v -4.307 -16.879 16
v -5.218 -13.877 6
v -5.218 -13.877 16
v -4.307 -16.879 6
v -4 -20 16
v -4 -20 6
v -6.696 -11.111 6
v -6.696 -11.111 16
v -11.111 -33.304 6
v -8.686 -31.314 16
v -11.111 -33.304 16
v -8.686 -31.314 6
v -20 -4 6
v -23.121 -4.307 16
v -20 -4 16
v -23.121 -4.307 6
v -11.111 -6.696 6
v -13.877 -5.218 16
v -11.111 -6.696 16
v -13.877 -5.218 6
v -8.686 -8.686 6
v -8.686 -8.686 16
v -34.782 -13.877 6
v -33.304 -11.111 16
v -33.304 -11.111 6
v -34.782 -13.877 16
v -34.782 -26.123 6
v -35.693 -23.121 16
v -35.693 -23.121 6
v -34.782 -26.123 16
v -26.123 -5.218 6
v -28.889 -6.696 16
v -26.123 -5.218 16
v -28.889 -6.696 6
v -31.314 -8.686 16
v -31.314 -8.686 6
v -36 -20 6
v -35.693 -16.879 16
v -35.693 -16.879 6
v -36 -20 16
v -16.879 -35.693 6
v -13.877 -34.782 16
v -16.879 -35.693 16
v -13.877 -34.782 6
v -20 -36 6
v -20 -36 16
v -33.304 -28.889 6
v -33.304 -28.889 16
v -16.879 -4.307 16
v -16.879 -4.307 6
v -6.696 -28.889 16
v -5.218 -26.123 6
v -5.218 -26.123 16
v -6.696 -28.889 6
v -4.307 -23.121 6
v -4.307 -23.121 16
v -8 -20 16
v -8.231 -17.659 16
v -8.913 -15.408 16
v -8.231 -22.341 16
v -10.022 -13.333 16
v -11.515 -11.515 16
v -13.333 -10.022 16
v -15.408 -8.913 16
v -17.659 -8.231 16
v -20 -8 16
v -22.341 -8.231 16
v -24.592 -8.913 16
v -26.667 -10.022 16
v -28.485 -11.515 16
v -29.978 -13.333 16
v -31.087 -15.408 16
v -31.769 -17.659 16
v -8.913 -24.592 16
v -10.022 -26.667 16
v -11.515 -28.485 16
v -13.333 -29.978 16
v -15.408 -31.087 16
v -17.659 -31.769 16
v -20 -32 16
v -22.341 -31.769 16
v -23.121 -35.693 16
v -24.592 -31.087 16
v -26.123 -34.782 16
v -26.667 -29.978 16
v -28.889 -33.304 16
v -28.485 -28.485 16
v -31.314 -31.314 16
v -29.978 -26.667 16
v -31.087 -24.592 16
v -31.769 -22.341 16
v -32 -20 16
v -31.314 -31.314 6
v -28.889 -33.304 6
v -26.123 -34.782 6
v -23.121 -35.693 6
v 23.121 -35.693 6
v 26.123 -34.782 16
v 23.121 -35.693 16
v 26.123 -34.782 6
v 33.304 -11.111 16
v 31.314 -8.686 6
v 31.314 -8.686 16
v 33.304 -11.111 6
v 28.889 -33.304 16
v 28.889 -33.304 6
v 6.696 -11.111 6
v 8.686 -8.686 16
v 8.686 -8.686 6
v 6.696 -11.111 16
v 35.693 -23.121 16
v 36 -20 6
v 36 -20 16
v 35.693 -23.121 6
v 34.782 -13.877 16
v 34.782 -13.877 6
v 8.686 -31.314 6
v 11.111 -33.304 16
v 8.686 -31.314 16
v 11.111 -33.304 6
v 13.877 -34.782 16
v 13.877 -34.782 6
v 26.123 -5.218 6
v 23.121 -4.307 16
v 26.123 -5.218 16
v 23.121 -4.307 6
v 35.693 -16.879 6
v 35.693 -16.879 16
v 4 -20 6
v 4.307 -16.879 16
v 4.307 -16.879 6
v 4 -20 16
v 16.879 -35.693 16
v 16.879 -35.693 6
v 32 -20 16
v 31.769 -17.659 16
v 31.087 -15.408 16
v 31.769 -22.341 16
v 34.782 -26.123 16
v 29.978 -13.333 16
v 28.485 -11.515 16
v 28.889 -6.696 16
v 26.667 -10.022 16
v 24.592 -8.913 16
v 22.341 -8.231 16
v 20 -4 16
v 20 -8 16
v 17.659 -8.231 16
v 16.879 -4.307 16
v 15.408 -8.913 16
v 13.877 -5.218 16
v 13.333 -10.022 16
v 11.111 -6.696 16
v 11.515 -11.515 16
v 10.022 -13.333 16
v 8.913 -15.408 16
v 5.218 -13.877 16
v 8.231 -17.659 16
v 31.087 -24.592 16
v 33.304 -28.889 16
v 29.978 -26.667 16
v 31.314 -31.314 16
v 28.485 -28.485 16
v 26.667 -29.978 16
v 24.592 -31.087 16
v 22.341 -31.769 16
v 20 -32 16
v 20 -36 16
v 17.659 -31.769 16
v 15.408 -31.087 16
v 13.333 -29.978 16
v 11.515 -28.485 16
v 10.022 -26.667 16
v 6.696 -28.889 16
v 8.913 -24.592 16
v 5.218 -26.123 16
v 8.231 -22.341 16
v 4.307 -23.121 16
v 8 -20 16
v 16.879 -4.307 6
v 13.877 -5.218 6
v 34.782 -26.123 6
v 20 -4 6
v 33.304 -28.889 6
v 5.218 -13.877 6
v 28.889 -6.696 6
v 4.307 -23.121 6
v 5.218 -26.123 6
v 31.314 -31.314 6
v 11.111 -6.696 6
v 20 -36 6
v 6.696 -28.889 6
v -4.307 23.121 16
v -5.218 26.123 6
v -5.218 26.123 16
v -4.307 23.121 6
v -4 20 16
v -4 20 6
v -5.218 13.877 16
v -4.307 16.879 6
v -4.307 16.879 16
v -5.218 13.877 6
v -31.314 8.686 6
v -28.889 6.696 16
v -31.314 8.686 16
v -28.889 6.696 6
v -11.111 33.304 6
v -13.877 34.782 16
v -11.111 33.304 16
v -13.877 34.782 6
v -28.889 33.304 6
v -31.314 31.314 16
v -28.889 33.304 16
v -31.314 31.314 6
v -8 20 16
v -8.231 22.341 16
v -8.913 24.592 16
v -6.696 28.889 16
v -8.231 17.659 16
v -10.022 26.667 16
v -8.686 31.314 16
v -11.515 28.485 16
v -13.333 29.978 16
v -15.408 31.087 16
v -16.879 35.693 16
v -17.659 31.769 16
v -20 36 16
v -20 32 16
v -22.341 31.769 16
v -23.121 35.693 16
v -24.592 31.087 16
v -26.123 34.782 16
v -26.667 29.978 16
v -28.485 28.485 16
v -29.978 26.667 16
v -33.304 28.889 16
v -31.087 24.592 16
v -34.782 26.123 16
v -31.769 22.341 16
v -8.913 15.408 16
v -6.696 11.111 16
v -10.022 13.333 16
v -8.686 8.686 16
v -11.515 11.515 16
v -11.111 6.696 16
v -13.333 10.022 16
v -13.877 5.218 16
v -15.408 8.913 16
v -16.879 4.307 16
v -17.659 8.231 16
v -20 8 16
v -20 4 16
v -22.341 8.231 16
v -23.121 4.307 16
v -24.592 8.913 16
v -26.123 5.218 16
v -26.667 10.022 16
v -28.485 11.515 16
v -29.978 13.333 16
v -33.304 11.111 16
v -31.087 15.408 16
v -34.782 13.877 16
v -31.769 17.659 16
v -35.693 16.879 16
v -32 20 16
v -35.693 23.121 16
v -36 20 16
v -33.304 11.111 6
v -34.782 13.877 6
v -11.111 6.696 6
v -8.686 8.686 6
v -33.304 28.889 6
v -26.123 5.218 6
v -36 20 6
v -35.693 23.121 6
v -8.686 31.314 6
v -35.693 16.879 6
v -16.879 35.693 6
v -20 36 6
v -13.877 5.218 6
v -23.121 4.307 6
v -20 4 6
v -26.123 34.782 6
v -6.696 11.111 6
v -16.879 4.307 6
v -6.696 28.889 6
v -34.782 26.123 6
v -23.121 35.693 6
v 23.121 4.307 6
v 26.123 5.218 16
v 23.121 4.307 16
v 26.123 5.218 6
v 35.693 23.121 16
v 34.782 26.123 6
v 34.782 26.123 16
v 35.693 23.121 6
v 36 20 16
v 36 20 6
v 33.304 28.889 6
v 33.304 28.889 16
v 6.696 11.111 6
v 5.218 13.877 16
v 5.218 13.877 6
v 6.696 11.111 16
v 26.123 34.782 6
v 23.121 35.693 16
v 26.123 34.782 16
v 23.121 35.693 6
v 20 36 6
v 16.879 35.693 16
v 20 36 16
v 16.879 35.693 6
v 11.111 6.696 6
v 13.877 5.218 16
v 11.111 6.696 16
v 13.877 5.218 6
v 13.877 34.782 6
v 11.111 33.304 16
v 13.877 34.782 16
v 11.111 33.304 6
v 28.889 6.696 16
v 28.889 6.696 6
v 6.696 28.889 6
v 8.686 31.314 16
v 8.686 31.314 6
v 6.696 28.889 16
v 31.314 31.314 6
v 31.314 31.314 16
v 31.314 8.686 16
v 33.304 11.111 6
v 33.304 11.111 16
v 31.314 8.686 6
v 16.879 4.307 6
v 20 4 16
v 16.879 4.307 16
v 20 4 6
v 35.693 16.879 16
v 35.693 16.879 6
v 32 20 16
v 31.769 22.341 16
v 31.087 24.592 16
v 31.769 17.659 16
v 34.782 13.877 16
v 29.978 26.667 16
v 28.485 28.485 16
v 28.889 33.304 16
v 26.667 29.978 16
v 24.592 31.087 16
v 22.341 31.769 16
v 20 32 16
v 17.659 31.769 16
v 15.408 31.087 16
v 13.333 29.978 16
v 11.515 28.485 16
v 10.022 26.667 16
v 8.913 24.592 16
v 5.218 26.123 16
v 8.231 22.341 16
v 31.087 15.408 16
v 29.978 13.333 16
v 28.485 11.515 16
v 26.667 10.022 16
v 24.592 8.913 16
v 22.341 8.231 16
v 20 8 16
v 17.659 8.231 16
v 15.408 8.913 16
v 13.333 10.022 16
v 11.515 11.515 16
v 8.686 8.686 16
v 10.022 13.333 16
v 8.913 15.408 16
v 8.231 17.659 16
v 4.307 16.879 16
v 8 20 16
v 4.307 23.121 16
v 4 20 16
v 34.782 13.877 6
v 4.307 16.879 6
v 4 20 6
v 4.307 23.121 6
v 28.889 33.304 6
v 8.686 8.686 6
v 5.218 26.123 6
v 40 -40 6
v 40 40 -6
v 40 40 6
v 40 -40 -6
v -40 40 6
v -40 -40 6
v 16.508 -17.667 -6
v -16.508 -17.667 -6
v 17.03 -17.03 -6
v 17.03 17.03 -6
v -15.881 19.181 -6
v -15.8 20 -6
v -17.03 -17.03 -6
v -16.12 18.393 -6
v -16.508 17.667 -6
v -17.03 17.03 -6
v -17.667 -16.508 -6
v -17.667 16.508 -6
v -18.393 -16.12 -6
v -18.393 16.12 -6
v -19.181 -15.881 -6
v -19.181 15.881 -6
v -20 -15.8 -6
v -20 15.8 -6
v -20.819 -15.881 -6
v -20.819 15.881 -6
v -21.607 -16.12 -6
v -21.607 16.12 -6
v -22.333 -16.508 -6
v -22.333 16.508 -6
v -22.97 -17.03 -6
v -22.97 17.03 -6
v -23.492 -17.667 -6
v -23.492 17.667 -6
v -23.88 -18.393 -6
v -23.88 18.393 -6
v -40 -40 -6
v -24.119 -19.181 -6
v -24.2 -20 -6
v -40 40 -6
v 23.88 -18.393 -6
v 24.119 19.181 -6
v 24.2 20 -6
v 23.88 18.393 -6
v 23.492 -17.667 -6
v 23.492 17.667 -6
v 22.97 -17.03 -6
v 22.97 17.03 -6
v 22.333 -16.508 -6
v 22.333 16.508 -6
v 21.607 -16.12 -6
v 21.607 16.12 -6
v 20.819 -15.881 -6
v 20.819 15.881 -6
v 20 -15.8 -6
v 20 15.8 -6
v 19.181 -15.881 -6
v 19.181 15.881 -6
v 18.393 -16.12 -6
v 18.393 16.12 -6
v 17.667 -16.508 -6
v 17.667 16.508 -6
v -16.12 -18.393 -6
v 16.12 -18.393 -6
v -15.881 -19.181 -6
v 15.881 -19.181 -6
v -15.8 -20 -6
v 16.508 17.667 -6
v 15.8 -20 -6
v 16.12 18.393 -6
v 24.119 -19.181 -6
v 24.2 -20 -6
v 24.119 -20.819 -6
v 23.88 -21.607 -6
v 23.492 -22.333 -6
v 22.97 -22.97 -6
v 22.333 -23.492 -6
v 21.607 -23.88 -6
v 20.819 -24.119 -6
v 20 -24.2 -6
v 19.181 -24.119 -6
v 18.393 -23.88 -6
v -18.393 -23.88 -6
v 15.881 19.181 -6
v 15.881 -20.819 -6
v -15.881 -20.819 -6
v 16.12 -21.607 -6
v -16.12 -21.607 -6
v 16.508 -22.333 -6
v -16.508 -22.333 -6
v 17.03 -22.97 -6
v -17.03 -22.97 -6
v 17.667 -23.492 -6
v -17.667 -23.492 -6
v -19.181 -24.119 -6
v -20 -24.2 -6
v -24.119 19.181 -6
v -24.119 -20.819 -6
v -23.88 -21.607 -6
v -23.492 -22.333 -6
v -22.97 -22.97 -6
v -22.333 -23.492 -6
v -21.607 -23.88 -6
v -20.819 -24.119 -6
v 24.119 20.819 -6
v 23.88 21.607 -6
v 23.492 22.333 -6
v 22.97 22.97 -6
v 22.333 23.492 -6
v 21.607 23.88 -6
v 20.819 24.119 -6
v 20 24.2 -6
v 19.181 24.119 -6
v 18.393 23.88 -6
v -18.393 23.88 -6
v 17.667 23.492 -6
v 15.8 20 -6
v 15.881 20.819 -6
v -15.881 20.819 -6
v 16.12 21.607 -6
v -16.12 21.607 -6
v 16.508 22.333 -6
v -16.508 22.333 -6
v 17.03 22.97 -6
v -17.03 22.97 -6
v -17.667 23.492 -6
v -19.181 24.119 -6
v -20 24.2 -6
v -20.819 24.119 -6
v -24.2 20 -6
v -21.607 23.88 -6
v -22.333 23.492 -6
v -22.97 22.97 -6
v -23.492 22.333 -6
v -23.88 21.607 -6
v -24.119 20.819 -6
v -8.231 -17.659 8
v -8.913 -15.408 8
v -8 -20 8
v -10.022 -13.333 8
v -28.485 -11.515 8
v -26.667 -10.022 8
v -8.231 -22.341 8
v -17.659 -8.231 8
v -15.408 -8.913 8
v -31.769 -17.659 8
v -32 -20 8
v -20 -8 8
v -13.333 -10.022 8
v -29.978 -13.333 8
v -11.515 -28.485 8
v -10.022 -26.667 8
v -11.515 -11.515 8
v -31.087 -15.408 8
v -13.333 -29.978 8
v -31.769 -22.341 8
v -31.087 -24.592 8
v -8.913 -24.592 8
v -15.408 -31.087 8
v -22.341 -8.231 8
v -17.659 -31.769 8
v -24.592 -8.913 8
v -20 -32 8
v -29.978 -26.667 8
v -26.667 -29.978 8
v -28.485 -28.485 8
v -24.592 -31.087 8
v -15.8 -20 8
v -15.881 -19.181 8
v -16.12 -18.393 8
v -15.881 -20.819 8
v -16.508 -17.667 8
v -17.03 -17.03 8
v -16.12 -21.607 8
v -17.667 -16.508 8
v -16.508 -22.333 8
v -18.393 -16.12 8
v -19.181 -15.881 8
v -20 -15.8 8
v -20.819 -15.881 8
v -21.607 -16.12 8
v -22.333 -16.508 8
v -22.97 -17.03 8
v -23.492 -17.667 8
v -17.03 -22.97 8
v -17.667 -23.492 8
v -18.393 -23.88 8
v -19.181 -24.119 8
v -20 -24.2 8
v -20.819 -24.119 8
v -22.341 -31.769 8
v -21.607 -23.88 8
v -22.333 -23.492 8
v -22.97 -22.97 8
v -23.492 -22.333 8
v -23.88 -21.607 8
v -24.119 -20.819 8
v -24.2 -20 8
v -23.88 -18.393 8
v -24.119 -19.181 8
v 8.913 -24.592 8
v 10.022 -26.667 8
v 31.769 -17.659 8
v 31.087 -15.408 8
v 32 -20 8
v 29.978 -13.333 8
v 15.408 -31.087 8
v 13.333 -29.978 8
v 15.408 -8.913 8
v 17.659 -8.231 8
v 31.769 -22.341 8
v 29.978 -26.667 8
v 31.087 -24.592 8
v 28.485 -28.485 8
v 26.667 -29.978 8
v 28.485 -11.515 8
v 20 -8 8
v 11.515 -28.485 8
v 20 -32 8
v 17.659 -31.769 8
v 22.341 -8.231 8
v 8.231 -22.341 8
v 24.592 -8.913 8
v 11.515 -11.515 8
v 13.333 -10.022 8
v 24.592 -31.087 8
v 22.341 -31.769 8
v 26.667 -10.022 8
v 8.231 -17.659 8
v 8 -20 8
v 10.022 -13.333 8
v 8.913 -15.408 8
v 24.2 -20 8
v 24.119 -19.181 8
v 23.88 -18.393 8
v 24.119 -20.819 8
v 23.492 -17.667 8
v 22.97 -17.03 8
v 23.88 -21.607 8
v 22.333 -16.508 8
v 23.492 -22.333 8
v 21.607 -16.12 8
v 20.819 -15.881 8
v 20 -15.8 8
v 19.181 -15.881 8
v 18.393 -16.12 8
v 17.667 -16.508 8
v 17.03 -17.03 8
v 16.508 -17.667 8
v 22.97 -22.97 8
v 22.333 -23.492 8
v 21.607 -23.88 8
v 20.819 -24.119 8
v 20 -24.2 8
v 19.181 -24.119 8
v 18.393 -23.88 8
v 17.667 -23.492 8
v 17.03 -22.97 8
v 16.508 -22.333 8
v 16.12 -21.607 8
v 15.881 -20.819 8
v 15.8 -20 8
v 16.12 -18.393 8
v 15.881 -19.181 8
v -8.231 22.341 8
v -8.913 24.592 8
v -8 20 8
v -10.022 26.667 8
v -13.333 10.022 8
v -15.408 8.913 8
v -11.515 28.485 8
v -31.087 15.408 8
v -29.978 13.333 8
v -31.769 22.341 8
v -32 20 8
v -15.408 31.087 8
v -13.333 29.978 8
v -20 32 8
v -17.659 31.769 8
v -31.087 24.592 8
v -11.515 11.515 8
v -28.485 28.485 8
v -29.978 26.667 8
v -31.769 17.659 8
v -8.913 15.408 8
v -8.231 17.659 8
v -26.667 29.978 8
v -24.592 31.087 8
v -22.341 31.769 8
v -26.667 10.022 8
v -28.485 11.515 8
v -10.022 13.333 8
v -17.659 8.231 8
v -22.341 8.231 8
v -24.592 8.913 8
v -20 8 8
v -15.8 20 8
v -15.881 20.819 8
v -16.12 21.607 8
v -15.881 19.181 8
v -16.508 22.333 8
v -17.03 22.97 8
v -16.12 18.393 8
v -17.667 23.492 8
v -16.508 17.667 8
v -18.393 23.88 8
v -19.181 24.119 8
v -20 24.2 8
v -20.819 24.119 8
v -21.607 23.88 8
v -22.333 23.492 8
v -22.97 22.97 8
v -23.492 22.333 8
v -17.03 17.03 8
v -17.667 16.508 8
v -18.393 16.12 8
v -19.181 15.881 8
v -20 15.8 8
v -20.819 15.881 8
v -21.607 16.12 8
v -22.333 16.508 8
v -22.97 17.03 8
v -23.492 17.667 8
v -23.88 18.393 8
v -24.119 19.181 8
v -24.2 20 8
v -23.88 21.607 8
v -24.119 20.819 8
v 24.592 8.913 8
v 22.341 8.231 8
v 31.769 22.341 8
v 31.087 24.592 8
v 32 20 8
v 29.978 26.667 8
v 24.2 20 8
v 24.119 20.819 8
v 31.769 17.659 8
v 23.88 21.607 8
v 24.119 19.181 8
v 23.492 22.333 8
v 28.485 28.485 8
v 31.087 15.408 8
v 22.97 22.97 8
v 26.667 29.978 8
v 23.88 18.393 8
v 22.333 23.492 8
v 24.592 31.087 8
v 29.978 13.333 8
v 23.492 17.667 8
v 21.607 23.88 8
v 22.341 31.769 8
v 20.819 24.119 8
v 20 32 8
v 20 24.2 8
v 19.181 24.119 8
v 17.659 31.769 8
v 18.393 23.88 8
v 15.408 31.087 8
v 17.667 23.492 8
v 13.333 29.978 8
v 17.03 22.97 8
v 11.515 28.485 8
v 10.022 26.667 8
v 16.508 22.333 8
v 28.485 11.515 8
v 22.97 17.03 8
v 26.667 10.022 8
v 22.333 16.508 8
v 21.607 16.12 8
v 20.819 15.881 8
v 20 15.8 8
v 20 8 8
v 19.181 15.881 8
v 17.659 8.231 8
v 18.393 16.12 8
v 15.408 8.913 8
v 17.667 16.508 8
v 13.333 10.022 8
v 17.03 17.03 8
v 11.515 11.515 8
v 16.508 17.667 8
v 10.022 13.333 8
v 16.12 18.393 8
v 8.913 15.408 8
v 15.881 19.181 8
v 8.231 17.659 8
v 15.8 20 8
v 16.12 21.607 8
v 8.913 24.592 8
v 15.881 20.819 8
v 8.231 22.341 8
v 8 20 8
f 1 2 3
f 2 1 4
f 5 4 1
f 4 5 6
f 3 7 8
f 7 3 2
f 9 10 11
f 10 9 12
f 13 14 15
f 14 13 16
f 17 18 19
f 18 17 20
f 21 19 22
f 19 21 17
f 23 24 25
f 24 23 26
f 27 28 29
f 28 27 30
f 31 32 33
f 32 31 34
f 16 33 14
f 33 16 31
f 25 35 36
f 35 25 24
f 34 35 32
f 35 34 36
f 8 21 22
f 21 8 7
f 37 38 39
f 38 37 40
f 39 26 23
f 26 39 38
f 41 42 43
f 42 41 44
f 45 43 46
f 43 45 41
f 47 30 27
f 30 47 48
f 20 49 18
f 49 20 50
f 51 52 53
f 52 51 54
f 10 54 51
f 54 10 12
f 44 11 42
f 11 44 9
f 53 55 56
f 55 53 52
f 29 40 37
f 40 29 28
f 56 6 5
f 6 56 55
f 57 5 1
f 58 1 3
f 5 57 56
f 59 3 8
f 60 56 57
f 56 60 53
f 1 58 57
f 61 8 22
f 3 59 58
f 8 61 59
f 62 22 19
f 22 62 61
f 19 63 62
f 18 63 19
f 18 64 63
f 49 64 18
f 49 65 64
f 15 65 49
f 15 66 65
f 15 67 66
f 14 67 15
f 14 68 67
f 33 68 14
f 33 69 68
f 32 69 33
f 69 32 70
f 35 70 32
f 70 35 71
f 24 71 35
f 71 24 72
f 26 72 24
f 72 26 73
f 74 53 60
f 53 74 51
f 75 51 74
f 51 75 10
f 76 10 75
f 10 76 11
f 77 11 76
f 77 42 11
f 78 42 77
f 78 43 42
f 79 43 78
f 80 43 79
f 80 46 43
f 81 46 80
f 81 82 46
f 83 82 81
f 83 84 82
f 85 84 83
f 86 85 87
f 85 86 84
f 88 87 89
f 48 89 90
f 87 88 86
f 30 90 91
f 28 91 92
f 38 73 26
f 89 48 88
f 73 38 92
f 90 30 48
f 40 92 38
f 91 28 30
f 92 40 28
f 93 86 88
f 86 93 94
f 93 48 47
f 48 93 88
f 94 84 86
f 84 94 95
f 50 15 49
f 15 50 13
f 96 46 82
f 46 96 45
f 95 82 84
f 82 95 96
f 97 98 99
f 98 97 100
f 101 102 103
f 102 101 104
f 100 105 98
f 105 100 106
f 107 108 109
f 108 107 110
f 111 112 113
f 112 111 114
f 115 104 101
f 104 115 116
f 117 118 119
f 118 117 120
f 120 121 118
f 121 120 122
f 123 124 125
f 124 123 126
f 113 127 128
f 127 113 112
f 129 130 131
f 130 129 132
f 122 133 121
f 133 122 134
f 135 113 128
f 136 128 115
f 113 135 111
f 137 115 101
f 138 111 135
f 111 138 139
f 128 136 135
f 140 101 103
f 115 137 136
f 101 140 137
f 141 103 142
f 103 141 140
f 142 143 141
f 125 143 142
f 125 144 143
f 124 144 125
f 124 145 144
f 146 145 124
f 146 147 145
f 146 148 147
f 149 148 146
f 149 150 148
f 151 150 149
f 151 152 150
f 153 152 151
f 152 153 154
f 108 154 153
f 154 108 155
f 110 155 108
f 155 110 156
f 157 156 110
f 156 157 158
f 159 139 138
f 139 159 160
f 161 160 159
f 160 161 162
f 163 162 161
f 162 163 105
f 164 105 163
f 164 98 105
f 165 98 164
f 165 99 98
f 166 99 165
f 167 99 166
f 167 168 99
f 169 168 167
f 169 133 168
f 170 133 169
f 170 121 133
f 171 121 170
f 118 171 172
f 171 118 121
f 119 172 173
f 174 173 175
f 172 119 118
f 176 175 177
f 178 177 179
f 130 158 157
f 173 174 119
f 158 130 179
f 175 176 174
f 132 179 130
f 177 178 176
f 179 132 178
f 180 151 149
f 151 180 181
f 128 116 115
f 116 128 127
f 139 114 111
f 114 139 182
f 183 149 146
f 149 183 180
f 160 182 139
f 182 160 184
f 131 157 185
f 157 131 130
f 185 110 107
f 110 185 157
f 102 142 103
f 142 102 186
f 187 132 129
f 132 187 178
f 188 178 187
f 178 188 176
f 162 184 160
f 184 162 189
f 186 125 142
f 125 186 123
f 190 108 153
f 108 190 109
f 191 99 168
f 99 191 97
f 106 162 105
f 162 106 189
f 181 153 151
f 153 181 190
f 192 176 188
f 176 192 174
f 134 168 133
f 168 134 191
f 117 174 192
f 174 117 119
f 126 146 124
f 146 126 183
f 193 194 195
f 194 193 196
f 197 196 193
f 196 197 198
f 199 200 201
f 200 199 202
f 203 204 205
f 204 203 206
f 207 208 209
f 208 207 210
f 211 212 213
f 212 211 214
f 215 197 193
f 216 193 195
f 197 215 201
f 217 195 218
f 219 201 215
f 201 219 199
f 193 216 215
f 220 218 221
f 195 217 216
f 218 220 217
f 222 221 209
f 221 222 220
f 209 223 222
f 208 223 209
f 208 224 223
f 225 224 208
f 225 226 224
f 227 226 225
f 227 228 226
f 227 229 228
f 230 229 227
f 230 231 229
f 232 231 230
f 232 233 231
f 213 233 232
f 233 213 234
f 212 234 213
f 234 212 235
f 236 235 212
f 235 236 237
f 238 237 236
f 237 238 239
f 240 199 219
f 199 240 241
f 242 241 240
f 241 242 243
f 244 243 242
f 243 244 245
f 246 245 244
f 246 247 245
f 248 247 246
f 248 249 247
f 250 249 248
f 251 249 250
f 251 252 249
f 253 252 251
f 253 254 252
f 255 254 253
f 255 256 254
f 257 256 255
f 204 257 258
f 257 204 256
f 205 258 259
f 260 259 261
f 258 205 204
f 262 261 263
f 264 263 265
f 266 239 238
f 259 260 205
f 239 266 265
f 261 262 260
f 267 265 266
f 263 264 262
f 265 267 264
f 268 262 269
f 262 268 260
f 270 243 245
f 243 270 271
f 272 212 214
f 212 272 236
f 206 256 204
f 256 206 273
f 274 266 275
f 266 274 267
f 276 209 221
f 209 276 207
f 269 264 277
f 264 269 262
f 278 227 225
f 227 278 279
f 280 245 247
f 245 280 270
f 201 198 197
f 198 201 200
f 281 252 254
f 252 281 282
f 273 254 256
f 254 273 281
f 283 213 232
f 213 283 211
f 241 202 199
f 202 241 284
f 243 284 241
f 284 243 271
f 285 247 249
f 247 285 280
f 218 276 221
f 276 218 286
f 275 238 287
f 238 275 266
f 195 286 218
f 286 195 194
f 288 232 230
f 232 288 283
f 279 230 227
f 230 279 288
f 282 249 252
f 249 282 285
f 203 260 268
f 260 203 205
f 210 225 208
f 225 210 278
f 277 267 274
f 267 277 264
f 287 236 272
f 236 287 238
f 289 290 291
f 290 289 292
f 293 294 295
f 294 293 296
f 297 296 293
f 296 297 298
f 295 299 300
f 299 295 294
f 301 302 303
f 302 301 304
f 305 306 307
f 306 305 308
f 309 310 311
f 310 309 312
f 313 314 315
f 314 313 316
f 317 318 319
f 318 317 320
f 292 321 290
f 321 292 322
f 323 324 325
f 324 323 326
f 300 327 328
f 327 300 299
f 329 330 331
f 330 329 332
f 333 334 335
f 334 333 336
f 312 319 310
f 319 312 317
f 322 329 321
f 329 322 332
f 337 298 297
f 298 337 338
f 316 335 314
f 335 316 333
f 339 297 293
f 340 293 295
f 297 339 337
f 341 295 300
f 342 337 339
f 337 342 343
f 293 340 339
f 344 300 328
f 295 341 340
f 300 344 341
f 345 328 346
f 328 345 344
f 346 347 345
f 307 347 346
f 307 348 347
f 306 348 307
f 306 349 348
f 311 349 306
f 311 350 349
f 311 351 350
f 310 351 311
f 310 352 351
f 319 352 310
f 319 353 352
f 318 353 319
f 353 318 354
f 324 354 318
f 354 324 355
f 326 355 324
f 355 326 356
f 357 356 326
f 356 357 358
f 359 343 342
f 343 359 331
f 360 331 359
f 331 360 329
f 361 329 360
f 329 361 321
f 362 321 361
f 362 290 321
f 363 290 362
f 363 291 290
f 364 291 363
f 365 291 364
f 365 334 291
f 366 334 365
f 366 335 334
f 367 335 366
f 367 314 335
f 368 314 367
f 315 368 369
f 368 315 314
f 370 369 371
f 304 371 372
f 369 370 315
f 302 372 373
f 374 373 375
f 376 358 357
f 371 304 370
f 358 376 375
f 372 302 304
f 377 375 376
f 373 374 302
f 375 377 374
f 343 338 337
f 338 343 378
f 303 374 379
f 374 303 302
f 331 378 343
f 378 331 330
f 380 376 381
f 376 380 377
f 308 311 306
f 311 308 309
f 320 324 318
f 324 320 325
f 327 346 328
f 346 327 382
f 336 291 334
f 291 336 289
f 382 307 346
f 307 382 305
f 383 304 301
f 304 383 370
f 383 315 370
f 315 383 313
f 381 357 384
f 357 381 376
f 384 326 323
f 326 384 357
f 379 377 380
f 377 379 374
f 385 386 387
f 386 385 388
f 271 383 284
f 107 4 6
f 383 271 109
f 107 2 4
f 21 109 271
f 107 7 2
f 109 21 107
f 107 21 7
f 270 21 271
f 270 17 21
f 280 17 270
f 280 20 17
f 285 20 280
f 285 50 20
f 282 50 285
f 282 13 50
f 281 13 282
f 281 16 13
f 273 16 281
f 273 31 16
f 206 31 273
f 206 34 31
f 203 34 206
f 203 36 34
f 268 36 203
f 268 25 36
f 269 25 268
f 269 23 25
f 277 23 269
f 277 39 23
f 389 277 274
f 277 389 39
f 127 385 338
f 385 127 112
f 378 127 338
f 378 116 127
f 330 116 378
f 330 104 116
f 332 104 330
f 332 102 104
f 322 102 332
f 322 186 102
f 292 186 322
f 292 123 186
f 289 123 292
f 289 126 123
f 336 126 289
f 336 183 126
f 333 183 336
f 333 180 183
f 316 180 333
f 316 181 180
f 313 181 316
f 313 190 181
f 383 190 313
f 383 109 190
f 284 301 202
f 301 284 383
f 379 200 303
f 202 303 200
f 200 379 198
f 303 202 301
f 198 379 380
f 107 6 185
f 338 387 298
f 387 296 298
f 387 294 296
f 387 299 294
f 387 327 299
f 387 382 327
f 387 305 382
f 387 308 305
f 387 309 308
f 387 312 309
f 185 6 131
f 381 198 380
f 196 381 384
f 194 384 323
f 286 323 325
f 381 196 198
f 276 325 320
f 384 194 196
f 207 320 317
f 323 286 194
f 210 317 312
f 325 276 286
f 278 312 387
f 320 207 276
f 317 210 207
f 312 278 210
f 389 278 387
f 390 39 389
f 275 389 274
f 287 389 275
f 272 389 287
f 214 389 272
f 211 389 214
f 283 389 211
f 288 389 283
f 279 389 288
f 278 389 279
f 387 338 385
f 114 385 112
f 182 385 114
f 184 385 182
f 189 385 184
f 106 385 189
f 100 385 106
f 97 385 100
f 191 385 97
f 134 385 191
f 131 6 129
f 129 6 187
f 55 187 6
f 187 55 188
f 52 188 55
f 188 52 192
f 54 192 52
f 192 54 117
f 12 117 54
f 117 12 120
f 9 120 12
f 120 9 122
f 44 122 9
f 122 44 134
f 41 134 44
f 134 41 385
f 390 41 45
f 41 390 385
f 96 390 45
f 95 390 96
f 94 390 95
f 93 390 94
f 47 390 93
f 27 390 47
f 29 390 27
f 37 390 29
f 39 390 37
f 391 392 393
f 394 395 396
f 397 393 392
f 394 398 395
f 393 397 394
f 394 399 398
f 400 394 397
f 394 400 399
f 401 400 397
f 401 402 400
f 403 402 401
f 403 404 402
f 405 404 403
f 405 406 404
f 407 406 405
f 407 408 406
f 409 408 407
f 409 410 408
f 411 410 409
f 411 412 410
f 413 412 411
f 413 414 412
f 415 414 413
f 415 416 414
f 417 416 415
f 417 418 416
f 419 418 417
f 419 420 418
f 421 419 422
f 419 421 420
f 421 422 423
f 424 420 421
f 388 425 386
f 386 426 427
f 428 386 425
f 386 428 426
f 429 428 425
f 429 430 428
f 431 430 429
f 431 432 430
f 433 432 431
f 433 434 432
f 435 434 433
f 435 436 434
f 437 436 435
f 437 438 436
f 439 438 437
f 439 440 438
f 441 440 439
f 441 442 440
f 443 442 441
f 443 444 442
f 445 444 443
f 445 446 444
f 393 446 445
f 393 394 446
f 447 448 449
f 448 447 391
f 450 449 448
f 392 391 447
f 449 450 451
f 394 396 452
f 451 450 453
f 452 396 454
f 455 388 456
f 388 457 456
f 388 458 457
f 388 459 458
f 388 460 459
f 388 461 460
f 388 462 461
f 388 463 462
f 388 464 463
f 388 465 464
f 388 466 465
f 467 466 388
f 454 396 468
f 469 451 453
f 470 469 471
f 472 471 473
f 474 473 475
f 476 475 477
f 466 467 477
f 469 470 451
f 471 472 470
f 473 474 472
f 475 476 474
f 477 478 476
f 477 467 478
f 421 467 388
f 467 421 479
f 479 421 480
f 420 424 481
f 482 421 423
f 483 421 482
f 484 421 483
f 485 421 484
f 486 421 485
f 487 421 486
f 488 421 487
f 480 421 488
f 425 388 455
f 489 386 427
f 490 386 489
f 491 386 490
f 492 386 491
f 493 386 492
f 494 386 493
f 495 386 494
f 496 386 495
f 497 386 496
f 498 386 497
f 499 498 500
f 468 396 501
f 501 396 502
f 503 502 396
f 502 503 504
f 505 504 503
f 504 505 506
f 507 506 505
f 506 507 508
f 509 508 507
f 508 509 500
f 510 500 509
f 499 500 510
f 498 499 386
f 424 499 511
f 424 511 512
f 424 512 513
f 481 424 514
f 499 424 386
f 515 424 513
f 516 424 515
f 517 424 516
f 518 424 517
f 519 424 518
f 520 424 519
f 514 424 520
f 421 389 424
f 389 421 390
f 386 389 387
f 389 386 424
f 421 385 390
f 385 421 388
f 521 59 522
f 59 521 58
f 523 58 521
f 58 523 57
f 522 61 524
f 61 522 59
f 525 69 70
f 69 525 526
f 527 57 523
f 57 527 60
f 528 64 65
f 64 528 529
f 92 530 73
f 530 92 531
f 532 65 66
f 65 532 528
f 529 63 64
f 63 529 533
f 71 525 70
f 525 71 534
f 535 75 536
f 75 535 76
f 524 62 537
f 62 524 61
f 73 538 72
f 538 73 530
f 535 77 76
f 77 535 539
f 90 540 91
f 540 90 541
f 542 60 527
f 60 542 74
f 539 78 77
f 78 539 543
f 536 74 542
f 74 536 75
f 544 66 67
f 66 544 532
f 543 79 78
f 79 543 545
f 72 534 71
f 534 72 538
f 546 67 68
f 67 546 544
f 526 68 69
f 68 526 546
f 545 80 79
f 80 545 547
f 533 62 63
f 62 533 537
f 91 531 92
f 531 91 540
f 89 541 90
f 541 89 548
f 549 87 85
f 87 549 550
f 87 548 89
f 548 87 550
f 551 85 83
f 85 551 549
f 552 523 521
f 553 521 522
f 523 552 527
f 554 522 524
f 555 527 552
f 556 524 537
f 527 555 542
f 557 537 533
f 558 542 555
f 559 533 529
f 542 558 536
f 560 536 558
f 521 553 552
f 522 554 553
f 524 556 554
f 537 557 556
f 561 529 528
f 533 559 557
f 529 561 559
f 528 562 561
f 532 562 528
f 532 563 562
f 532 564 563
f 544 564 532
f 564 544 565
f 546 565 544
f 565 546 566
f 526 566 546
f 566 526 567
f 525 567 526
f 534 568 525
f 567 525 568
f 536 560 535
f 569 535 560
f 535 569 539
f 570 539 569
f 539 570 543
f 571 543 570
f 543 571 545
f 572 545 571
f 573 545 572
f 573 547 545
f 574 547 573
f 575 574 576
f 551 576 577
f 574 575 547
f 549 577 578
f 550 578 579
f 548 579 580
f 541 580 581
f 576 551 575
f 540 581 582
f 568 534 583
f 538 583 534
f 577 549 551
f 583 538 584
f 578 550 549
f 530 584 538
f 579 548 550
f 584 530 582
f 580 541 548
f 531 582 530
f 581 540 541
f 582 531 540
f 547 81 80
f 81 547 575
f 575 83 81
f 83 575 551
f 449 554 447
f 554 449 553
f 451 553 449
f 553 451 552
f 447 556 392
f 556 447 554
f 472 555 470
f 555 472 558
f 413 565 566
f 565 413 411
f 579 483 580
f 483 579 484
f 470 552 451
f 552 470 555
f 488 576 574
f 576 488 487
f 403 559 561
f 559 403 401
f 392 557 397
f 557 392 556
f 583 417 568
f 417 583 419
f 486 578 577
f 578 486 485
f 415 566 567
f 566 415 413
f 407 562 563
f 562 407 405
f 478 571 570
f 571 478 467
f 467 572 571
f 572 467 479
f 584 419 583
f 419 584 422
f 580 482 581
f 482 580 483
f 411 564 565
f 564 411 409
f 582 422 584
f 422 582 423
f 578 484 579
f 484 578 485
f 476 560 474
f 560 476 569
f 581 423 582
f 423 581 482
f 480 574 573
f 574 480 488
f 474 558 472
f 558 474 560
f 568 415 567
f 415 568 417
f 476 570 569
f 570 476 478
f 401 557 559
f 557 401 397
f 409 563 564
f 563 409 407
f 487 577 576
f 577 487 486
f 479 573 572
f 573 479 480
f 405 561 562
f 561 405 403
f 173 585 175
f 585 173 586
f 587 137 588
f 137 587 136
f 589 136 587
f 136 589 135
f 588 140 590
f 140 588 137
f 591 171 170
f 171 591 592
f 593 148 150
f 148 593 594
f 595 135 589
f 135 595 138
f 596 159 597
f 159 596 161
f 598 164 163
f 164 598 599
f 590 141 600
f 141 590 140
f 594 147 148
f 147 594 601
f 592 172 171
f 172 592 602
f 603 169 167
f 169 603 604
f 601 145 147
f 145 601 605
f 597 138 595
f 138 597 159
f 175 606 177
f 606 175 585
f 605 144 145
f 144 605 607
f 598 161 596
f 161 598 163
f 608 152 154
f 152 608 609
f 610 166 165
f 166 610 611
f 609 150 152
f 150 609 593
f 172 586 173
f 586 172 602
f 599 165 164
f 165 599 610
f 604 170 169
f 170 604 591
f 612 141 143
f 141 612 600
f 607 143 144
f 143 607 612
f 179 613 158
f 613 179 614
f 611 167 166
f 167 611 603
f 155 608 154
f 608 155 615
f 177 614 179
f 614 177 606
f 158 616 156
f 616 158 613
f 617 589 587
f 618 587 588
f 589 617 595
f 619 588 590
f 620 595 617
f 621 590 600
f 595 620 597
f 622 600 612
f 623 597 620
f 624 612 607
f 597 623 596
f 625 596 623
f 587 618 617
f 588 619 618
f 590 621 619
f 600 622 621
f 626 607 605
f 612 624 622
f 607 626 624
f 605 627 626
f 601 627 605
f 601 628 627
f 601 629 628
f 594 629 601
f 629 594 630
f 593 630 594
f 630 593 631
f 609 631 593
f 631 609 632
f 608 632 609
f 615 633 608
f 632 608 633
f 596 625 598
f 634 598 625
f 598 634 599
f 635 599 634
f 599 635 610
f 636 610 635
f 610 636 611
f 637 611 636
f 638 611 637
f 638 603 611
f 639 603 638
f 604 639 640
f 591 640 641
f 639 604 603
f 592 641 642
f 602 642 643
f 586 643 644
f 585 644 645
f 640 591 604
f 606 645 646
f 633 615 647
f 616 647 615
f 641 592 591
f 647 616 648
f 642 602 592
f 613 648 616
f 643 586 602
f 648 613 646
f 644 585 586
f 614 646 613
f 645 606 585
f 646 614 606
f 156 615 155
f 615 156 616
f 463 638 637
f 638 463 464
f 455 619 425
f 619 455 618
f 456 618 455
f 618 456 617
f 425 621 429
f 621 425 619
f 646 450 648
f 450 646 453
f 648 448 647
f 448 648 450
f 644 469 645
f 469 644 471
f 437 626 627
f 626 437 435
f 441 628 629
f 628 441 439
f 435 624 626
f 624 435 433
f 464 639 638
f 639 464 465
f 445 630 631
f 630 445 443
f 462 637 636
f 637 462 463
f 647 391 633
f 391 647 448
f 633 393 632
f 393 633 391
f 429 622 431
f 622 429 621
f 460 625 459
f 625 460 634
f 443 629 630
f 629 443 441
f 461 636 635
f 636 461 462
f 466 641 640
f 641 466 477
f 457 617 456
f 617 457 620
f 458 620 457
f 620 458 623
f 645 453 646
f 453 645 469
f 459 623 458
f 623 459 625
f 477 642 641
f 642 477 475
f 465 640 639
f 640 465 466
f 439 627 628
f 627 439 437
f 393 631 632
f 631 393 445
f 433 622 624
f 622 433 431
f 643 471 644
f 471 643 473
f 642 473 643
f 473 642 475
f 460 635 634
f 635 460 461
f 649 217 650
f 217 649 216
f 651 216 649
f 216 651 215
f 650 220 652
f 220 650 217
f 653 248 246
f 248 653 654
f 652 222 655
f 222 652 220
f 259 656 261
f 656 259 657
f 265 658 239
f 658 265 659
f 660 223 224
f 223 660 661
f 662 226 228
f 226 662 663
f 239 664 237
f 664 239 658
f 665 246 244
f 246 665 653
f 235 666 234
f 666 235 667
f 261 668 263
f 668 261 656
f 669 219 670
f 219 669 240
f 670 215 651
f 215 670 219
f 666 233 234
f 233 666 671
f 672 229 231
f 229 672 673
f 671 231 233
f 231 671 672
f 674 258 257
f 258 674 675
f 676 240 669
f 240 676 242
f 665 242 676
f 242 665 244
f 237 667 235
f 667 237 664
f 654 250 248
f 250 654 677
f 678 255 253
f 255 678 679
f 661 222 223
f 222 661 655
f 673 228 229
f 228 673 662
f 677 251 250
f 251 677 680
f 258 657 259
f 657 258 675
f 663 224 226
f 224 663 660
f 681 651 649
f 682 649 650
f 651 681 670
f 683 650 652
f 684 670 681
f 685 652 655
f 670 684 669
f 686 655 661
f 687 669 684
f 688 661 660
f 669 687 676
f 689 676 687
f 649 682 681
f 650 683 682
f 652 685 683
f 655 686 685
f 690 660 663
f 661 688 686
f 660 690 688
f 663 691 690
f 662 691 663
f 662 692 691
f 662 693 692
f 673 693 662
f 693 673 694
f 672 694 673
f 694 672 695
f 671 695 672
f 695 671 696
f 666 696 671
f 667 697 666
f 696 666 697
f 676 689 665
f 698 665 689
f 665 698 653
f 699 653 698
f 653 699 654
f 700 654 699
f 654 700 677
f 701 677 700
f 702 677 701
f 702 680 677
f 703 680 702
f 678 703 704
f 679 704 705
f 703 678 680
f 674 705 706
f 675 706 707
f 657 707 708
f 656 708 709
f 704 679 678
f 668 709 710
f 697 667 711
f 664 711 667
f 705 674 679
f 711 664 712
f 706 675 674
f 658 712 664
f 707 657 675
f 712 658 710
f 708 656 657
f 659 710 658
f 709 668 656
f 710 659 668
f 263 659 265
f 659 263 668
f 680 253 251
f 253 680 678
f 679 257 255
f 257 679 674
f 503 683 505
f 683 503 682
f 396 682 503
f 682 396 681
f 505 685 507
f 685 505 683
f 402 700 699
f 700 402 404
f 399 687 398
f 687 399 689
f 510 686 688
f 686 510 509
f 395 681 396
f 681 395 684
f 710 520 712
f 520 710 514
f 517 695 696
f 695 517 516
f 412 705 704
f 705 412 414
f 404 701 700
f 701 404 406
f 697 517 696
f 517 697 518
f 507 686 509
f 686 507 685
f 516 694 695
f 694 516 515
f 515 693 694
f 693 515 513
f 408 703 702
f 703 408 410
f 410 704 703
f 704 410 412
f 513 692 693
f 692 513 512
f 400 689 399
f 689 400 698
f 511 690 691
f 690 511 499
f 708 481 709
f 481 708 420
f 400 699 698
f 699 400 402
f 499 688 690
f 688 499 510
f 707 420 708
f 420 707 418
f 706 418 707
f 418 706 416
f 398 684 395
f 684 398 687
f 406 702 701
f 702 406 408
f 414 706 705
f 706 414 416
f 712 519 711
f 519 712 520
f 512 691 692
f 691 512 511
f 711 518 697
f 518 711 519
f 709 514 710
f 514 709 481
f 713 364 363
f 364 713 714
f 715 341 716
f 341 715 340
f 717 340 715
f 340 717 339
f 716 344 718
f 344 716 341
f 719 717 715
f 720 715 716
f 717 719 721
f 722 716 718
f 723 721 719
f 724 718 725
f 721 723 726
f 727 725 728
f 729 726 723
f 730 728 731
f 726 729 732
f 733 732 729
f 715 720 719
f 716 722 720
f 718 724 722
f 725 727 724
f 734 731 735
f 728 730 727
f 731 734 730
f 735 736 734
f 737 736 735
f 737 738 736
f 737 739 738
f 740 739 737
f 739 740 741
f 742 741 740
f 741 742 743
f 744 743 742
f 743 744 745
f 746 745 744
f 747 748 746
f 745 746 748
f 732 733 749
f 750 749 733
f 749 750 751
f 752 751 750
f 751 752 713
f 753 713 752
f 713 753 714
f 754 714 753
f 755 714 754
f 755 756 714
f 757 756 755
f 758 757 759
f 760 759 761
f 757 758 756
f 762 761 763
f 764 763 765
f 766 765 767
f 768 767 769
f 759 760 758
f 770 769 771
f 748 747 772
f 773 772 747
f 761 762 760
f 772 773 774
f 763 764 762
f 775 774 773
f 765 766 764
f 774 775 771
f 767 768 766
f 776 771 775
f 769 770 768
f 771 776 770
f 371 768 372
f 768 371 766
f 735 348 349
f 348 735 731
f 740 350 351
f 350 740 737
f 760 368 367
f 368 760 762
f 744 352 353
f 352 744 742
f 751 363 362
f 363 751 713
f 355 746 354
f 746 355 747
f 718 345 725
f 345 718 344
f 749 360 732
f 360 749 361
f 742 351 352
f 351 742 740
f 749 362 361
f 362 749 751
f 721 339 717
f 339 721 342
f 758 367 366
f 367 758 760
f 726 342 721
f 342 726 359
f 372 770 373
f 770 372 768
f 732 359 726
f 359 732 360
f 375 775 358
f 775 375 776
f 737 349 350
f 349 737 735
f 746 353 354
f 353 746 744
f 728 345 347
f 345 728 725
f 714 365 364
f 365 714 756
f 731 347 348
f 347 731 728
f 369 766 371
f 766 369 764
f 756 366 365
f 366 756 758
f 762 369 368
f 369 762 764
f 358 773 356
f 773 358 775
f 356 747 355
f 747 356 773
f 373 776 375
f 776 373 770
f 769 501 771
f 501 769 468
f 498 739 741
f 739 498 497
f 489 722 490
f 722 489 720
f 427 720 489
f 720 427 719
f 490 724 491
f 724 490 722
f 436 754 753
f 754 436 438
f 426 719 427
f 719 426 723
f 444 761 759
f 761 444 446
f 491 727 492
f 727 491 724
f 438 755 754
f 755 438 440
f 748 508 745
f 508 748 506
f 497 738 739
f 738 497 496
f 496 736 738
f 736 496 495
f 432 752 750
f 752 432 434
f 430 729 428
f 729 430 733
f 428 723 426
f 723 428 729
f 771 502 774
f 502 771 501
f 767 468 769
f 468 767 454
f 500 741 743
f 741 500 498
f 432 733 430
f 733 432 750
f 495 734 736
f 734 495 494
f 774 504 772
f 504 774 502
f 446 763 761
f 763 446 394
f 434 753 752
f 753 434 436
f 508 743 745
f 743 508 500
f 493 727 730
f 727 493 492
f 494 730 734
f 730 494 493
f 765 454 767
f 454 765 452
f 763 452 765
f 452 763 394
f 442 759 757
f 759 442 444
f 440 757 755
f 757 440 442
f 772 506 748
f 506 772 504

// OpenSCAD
$fn = 32;

// ----------------------------------------------------------------------
// Socket pad plate
// bosses with counterbored sockets for the screws
// ----------------------------------------------------------------------

// --- parameters (mm) ---
base_t = 12;       // base plate thickness
boss_h = 10;       // boss height above the base plate
boss_d = 32;       // boss diameter
socket_d = 24;     // socket diameter
socket_depth = 8;  // socket depth from the boss face
bolt_d = 8.4;      // screw clearance hole through the socket floor
rows = 2;          // boss rows
cols = 2;          // bosses per row
pitch = 40;        // boss pitch

// --- derived feature positions (mm) ---
height = base_t + boss_h;           // = 22   overall height of the part
plate = [pitch * (cols - 1) + boss_d + 8, pitch * (rows - 1) + boss_d + 8, base_t];  // = [80, 80, 12]   overall size (x, y, z)
span_x = pitch * (cols - 1);        // = 40   distance between outer bosses
span_y = pitch * (rows - 1);        // = 40   distance between boss rows
origin_x = -span_x / 2;             // = -20   X of the first boss
origin_y = -span_y / 2;             // = -20   Y of the first boss
feature_centers = [
  [origin_x + 0 * pitch, origin_y + 0 * pitch],
  [origin_x + 1 * pitch, origin_y + 0 * pitch],
  [origin_x + 0 * pitch, origin_y + 1 * pitch],
  [origin_x + 1 * pitch, origin_y + 1 * pitch]
];   // boss centres: sockets, holes and the pads themselves are placed from here

// base plate, bosses on feature_centers, socket + through hole in each
difference() {
  union() {
    cube(plate, center = true);
    for (centre = feature_centers)
      translate([centre[0], centre[1], plate[2] / 2 - 1])
        cylinder(d = boss_d, h = boss_h + 1);
  }
  for (centre = feature_centers) {
    translate([centre[0], centre[1], plate[2] / 2 + boss_h - socket_depth])
      cylinder(d = socket_d, h = socket_depth + 1);
    translate([centre[0], centre[1], -height])
      cylinder(d = bolt_d, h = 2 * height + 2);  // through the socket floor
  }
}
